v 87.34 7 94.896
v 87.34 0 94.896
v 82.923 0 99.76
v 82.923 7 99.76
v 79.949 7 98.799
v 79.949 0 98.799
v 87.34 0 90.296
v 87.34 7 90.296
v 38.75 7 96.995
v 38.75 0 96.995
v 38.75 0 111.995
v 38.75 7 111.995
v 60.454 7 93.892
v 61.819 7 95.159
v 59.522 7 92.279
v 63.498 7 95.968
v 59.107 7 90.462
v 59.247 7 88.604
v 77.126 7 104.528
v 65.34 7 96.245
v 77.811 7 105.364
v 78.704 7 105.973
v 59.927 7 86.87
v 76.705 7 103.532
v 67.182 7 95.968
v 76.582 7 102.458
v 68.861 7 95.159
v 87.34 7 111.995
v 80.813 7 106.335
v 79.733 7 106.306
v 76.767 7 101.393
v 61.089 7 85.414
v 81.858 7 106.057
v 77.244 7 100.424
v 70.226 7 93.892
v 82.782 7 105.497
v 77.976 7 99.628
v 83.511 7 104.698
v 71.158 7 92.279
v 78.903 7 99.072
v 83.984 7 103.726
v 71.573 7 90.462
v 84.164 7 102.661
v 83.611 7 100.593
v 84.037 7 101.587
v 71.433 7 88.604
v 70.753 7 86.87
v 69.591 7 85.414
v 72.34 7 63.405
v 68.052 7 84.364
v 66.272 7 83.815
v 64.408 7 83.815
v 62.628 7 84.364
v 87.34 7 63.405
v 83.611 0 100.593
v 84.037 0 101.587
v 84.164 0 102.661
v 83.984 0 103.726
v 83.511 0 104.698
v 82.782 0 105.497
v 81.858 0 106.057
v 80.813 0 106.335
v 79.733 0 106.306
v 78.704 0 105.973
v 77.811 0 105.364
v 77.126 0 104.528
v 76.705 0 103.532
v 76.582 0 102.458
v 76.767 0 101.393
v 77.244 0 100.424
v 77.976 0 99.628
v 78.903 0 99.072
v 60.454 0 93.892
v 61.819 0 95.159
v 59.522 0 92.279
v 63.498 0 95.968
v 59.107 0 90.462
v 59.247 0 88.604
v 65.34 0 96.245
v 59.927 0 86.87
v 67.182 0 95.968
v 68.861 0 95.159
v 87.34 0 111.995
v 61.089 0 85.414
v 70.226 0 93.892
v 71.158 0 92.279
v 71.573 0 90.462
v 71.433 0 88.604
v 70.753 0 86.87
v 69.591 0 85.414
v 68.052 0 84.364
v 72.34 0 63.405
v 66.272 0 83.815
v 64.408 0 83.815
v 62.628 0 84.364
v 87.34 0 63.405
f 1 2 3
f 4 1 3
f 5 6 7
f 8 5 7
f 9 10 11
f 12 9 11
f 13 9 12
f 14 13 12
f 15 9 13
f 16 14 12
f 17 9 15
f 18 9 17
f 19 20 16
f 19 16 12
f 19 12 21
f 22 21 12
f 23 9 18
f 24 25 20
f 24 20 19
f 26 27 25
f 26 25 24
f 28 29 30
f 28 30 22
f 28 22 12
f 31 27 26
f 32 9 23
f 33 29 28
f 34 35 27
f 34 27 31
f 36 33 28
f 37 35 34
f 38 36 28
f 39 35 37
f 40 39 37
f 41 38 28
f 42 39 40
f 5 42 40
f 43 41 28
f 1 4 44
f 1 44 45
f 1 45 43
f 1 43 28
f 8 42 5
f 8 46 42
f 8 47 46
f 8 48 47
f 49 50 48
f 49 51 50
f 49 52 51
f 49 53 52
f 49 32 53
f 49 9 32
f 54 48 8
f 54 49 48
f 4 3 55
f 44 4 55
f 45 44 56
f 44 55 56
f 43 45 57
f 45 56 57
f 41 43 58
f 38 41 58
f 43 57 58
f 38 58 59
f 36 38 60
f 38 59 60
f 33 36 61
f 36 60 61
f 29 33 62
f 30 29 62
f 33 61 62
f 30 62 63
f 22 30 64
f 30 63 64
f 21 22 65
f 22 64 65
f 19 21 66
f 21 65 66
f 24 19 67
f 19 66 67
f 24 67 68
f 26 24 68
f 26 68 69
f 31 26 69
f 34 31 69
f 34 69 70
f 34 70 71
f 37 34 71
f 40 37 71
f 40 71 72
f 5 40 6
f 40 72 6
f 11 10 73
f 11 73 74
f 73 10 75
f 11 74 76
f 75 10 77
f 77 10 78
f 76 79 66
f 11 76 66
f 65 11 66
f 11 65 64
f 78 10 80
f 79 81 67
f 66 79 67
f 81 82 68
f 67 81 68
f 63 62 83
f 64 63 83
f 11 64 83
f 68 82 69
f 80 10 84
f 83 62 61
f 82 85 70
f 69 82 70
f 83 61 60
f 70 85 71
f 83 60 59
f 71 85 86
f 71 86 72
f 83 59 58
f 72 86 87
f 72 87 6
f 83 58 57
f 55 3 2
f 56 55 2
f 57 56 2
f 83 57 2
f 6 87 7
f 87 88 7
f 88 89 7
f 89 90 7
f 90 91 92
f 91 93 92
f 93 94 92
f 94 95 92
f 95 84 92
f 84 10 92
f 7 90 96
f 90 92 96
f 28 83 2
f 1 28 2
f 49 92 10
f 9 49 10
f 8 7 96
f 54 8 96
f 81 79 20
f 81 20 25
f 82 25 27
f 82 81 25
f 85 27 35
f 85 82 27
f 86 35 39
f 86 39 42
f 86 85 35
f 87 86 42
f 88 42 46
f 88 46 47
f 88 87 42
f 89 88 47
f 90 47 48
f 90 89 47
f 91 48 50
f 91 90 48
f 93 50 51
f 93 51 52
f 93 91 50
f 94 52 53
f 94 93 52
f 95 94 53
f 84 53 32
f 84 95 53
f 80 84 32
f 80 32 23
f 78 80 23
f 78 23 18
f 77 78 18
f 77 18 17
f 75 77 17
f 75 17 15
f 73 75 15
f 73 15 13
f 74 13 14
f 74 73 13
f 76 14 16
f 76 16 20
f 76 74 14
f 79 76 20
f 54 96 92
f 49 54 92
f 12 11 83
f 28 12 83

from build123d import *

# Parameters (mm, degrees)
SKETCH1_R           = 6.25
BOSS_EXTRUDE1_DEPTH = 7


with BuildPart() as part:
    # Sketch1 → Boss-Extrude1 (new body)
    with BuildSketch(Plane(origin=(0, 0, 0), x_dir=(1, 0, 0), z_dir=(0, 1, 0))):
        with BuildLine():
            Line((72.34, -63.405178012), (38.75, -96.995178012))
            Line((38.75, -96.995178012), (38.75, -111.995178012))
            Line((38.75, -111.995178012), (87.34, -111.995178012))
            Line((87.34, -111.995178012), (87.34, -94.896256746))
            Line((87.34, -94.896256746), (82.922661505, -99.760117279))
            ThreePointArc((82.922661505, -99.760117279), (79.206389469, -106.17642477), (79.948751144, -98.798852079))
            Line((79.948751144, -98.798852079), (87.34, -90.296256746))
            Line((87.34, -90.296256746), (87.34, -63.405178012))
            Line((87.34, -63.405178012), (72.34, -63.405178012))
        make_face()
        with Locations(Location((65.34, -89.995178012, 0), (0, 0, 270))):
            Circle(SKETCH1_R, mode=Mode.SUBTRACT)
    extrude(amount=BOSS_EXTRUDE1_DEPTH)


solid = part.part
